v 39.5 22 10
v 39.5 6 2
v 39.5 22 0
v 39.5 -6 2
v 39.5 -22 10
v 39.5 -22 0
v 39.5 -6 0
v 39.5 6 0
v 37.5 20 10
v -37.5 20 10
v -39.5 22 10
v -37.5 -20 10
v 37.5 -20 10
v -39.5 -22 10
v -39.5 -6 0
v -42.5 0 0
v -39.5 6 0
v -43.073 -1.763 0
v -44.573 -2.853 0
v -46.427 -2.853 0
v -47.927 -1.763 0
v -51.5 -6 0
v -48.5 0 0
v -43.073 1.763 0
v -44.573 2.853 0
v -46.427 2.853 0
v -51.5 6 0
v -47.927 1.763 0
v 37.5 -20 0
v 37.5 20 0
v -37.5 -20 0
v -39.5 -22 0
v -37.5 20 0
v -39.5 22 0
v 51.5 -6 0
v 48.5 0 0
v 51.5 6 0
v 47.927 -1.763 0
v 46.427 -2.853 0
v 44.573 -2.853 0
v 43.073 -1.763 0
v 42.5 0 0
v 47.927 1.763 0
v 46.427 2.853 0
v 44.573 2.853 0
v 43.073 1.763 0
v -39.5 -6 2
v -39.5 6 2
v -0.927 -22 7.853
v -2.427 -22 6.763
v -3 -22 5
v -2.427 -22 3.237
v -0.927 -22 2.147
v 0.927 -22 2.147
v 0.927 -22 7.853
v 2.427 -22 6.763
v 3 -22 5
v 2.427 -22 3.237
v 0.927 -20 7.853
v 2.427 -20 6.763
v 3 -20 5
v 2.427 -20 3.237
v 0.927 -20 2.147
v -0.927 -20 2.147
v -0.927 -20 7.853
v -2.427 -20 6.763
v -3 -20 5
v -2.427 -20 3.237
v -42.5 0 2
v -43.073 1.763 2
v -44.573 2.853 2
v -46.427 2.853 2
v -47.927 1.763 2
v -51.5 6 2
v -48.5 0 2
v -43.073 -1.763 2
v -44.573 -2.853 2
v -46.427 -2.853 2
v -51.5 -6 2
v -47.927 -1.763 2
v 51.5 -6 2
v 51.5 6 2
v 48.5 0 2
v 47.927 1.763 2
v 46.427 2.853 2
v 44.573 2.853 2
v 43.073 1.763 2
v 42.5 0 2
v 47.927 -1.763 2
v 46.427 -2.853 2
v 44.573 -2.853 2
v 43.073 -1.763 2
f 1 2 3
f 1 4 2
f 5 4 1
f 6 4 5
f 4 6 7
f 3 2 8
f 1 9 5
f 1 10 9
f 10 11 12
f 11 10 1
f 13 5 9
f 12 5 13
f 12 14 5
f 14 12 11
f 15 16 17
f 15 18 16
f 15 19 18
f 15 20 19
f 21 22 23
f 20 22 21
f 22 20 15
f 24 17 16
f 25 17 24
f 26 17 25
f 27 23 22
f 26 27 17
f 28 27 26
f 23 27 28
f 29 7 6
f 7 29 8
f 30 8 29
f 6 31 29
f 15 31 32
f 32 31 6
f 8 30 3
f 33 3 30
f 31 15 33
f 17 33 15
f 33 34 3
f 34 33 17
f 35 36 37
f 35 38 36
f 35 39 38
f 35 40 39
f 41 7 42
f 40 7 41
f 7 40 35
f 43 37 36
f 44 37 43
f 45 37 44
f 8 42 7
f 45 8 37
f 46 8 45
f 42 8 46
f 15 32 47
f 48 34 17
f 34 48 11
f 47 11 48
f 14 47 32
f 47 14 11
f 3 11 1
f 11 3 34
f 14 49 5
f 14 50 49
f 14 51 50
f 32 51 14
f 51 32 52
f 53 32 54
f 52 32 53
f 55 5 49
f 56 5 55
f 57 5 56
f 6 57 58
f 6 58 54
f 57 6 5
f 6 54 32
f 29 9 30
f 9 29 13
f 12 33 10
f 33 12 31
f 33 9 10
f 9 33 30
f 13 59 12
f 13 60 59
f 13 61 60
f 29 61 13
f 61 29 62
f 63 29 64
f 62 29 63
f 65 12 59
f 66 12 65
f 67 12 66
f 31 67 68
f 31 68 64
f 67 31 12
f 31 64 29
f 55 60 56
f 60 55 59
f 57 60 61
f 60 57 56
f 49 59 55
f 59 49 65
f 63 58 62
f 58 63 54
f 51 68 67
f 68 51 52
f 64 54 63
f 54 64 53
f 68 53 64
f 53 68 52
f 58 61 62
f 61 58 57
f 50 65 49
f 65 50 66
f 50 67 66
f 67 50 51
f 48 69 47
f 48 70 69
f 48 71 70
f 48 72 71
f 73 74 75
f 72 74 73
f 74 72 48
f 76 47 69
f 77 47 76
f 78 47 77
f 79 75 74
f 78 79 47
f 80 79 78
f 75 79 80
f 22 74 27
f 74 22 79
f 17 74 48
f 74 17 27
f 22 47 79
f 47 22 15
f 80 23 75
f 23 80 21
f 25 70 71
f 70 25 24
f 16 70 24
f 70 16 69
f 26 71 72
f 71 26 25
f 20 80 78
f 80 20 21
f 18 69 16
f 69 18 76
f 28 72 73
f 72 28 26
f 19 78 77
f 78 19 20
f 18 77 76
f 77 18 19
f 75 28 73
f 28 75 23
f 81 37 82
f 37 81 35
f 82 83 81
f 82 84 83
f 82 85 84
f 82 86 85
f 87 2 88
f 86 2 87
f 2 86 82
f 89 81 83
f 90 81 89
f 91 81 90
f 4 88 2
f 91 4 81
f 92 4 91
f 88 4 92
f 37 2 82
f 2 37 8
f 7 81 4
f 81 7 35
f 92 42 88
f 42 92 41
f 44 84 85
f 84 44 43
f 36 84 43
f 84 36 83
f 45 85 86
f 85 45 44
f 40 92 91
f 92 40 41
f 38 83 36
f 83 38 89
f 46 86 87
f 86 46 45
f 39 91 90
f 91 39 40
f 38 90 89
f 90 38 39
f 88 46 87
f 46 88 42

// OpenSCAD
Thickness = 2; //[]
rect_X = 75; //[]
rect_Y = 40; //[]
hole = 6; //[]
Height = 10; //[]
Mount_SL = 12; //[]

union() {
	difference() {
		translate(v = [0, 0, (Height / 2)]) {
			difference() {
				cube(center = true, size = [(rect_X + (2 * Thickness)), (rect_Y + (2 * Thickness)), Height]);
				cube(center = true, size = [rect_X, rect_Y, (Height * 2)]);
			}
		}
		translate(v = [0, 0, (Height / 2)]) {
			rotate(a = [90, 0, 0]) {
				cylinder(d = hole, h = 30);
			}
		}
	}
	translate(v = [(-(((Mount_SL / 2) + (rect_X / 2)) + Thickness)), 0, 0]) {
		difference() {
			translate(v = [0, 0, (Thickness / 2)]) {
				cube(center = true, size = [Mount_SL, Mount_SL, Thickness]);
			}
			translate(v = [0, 0, (-(Thickness / 2))]) {
				cylinder(d = hole, h = (Thickness * 2));
			}
		}
	}
	translate(v = [((rect_X + (2 * Thickness)) + Mount_SL), 0, 0]) {
		translate(v = [(-(((Mount_SL / 2) + (rect_X / 2)) + Thickness)), 0, 0]) {
			difference() {
				translate(v = [0, 0, (Thickness / 2)]) {
					cube(center = true, size = [Mount_SL, Mount_SL, Thickness]);
				}
				translate(v = [0, 0, (-(Thickness / 2))]) {
					cylinder(d = hole, h = (Thickness * 2));
				}
			}
		}
	}
}
